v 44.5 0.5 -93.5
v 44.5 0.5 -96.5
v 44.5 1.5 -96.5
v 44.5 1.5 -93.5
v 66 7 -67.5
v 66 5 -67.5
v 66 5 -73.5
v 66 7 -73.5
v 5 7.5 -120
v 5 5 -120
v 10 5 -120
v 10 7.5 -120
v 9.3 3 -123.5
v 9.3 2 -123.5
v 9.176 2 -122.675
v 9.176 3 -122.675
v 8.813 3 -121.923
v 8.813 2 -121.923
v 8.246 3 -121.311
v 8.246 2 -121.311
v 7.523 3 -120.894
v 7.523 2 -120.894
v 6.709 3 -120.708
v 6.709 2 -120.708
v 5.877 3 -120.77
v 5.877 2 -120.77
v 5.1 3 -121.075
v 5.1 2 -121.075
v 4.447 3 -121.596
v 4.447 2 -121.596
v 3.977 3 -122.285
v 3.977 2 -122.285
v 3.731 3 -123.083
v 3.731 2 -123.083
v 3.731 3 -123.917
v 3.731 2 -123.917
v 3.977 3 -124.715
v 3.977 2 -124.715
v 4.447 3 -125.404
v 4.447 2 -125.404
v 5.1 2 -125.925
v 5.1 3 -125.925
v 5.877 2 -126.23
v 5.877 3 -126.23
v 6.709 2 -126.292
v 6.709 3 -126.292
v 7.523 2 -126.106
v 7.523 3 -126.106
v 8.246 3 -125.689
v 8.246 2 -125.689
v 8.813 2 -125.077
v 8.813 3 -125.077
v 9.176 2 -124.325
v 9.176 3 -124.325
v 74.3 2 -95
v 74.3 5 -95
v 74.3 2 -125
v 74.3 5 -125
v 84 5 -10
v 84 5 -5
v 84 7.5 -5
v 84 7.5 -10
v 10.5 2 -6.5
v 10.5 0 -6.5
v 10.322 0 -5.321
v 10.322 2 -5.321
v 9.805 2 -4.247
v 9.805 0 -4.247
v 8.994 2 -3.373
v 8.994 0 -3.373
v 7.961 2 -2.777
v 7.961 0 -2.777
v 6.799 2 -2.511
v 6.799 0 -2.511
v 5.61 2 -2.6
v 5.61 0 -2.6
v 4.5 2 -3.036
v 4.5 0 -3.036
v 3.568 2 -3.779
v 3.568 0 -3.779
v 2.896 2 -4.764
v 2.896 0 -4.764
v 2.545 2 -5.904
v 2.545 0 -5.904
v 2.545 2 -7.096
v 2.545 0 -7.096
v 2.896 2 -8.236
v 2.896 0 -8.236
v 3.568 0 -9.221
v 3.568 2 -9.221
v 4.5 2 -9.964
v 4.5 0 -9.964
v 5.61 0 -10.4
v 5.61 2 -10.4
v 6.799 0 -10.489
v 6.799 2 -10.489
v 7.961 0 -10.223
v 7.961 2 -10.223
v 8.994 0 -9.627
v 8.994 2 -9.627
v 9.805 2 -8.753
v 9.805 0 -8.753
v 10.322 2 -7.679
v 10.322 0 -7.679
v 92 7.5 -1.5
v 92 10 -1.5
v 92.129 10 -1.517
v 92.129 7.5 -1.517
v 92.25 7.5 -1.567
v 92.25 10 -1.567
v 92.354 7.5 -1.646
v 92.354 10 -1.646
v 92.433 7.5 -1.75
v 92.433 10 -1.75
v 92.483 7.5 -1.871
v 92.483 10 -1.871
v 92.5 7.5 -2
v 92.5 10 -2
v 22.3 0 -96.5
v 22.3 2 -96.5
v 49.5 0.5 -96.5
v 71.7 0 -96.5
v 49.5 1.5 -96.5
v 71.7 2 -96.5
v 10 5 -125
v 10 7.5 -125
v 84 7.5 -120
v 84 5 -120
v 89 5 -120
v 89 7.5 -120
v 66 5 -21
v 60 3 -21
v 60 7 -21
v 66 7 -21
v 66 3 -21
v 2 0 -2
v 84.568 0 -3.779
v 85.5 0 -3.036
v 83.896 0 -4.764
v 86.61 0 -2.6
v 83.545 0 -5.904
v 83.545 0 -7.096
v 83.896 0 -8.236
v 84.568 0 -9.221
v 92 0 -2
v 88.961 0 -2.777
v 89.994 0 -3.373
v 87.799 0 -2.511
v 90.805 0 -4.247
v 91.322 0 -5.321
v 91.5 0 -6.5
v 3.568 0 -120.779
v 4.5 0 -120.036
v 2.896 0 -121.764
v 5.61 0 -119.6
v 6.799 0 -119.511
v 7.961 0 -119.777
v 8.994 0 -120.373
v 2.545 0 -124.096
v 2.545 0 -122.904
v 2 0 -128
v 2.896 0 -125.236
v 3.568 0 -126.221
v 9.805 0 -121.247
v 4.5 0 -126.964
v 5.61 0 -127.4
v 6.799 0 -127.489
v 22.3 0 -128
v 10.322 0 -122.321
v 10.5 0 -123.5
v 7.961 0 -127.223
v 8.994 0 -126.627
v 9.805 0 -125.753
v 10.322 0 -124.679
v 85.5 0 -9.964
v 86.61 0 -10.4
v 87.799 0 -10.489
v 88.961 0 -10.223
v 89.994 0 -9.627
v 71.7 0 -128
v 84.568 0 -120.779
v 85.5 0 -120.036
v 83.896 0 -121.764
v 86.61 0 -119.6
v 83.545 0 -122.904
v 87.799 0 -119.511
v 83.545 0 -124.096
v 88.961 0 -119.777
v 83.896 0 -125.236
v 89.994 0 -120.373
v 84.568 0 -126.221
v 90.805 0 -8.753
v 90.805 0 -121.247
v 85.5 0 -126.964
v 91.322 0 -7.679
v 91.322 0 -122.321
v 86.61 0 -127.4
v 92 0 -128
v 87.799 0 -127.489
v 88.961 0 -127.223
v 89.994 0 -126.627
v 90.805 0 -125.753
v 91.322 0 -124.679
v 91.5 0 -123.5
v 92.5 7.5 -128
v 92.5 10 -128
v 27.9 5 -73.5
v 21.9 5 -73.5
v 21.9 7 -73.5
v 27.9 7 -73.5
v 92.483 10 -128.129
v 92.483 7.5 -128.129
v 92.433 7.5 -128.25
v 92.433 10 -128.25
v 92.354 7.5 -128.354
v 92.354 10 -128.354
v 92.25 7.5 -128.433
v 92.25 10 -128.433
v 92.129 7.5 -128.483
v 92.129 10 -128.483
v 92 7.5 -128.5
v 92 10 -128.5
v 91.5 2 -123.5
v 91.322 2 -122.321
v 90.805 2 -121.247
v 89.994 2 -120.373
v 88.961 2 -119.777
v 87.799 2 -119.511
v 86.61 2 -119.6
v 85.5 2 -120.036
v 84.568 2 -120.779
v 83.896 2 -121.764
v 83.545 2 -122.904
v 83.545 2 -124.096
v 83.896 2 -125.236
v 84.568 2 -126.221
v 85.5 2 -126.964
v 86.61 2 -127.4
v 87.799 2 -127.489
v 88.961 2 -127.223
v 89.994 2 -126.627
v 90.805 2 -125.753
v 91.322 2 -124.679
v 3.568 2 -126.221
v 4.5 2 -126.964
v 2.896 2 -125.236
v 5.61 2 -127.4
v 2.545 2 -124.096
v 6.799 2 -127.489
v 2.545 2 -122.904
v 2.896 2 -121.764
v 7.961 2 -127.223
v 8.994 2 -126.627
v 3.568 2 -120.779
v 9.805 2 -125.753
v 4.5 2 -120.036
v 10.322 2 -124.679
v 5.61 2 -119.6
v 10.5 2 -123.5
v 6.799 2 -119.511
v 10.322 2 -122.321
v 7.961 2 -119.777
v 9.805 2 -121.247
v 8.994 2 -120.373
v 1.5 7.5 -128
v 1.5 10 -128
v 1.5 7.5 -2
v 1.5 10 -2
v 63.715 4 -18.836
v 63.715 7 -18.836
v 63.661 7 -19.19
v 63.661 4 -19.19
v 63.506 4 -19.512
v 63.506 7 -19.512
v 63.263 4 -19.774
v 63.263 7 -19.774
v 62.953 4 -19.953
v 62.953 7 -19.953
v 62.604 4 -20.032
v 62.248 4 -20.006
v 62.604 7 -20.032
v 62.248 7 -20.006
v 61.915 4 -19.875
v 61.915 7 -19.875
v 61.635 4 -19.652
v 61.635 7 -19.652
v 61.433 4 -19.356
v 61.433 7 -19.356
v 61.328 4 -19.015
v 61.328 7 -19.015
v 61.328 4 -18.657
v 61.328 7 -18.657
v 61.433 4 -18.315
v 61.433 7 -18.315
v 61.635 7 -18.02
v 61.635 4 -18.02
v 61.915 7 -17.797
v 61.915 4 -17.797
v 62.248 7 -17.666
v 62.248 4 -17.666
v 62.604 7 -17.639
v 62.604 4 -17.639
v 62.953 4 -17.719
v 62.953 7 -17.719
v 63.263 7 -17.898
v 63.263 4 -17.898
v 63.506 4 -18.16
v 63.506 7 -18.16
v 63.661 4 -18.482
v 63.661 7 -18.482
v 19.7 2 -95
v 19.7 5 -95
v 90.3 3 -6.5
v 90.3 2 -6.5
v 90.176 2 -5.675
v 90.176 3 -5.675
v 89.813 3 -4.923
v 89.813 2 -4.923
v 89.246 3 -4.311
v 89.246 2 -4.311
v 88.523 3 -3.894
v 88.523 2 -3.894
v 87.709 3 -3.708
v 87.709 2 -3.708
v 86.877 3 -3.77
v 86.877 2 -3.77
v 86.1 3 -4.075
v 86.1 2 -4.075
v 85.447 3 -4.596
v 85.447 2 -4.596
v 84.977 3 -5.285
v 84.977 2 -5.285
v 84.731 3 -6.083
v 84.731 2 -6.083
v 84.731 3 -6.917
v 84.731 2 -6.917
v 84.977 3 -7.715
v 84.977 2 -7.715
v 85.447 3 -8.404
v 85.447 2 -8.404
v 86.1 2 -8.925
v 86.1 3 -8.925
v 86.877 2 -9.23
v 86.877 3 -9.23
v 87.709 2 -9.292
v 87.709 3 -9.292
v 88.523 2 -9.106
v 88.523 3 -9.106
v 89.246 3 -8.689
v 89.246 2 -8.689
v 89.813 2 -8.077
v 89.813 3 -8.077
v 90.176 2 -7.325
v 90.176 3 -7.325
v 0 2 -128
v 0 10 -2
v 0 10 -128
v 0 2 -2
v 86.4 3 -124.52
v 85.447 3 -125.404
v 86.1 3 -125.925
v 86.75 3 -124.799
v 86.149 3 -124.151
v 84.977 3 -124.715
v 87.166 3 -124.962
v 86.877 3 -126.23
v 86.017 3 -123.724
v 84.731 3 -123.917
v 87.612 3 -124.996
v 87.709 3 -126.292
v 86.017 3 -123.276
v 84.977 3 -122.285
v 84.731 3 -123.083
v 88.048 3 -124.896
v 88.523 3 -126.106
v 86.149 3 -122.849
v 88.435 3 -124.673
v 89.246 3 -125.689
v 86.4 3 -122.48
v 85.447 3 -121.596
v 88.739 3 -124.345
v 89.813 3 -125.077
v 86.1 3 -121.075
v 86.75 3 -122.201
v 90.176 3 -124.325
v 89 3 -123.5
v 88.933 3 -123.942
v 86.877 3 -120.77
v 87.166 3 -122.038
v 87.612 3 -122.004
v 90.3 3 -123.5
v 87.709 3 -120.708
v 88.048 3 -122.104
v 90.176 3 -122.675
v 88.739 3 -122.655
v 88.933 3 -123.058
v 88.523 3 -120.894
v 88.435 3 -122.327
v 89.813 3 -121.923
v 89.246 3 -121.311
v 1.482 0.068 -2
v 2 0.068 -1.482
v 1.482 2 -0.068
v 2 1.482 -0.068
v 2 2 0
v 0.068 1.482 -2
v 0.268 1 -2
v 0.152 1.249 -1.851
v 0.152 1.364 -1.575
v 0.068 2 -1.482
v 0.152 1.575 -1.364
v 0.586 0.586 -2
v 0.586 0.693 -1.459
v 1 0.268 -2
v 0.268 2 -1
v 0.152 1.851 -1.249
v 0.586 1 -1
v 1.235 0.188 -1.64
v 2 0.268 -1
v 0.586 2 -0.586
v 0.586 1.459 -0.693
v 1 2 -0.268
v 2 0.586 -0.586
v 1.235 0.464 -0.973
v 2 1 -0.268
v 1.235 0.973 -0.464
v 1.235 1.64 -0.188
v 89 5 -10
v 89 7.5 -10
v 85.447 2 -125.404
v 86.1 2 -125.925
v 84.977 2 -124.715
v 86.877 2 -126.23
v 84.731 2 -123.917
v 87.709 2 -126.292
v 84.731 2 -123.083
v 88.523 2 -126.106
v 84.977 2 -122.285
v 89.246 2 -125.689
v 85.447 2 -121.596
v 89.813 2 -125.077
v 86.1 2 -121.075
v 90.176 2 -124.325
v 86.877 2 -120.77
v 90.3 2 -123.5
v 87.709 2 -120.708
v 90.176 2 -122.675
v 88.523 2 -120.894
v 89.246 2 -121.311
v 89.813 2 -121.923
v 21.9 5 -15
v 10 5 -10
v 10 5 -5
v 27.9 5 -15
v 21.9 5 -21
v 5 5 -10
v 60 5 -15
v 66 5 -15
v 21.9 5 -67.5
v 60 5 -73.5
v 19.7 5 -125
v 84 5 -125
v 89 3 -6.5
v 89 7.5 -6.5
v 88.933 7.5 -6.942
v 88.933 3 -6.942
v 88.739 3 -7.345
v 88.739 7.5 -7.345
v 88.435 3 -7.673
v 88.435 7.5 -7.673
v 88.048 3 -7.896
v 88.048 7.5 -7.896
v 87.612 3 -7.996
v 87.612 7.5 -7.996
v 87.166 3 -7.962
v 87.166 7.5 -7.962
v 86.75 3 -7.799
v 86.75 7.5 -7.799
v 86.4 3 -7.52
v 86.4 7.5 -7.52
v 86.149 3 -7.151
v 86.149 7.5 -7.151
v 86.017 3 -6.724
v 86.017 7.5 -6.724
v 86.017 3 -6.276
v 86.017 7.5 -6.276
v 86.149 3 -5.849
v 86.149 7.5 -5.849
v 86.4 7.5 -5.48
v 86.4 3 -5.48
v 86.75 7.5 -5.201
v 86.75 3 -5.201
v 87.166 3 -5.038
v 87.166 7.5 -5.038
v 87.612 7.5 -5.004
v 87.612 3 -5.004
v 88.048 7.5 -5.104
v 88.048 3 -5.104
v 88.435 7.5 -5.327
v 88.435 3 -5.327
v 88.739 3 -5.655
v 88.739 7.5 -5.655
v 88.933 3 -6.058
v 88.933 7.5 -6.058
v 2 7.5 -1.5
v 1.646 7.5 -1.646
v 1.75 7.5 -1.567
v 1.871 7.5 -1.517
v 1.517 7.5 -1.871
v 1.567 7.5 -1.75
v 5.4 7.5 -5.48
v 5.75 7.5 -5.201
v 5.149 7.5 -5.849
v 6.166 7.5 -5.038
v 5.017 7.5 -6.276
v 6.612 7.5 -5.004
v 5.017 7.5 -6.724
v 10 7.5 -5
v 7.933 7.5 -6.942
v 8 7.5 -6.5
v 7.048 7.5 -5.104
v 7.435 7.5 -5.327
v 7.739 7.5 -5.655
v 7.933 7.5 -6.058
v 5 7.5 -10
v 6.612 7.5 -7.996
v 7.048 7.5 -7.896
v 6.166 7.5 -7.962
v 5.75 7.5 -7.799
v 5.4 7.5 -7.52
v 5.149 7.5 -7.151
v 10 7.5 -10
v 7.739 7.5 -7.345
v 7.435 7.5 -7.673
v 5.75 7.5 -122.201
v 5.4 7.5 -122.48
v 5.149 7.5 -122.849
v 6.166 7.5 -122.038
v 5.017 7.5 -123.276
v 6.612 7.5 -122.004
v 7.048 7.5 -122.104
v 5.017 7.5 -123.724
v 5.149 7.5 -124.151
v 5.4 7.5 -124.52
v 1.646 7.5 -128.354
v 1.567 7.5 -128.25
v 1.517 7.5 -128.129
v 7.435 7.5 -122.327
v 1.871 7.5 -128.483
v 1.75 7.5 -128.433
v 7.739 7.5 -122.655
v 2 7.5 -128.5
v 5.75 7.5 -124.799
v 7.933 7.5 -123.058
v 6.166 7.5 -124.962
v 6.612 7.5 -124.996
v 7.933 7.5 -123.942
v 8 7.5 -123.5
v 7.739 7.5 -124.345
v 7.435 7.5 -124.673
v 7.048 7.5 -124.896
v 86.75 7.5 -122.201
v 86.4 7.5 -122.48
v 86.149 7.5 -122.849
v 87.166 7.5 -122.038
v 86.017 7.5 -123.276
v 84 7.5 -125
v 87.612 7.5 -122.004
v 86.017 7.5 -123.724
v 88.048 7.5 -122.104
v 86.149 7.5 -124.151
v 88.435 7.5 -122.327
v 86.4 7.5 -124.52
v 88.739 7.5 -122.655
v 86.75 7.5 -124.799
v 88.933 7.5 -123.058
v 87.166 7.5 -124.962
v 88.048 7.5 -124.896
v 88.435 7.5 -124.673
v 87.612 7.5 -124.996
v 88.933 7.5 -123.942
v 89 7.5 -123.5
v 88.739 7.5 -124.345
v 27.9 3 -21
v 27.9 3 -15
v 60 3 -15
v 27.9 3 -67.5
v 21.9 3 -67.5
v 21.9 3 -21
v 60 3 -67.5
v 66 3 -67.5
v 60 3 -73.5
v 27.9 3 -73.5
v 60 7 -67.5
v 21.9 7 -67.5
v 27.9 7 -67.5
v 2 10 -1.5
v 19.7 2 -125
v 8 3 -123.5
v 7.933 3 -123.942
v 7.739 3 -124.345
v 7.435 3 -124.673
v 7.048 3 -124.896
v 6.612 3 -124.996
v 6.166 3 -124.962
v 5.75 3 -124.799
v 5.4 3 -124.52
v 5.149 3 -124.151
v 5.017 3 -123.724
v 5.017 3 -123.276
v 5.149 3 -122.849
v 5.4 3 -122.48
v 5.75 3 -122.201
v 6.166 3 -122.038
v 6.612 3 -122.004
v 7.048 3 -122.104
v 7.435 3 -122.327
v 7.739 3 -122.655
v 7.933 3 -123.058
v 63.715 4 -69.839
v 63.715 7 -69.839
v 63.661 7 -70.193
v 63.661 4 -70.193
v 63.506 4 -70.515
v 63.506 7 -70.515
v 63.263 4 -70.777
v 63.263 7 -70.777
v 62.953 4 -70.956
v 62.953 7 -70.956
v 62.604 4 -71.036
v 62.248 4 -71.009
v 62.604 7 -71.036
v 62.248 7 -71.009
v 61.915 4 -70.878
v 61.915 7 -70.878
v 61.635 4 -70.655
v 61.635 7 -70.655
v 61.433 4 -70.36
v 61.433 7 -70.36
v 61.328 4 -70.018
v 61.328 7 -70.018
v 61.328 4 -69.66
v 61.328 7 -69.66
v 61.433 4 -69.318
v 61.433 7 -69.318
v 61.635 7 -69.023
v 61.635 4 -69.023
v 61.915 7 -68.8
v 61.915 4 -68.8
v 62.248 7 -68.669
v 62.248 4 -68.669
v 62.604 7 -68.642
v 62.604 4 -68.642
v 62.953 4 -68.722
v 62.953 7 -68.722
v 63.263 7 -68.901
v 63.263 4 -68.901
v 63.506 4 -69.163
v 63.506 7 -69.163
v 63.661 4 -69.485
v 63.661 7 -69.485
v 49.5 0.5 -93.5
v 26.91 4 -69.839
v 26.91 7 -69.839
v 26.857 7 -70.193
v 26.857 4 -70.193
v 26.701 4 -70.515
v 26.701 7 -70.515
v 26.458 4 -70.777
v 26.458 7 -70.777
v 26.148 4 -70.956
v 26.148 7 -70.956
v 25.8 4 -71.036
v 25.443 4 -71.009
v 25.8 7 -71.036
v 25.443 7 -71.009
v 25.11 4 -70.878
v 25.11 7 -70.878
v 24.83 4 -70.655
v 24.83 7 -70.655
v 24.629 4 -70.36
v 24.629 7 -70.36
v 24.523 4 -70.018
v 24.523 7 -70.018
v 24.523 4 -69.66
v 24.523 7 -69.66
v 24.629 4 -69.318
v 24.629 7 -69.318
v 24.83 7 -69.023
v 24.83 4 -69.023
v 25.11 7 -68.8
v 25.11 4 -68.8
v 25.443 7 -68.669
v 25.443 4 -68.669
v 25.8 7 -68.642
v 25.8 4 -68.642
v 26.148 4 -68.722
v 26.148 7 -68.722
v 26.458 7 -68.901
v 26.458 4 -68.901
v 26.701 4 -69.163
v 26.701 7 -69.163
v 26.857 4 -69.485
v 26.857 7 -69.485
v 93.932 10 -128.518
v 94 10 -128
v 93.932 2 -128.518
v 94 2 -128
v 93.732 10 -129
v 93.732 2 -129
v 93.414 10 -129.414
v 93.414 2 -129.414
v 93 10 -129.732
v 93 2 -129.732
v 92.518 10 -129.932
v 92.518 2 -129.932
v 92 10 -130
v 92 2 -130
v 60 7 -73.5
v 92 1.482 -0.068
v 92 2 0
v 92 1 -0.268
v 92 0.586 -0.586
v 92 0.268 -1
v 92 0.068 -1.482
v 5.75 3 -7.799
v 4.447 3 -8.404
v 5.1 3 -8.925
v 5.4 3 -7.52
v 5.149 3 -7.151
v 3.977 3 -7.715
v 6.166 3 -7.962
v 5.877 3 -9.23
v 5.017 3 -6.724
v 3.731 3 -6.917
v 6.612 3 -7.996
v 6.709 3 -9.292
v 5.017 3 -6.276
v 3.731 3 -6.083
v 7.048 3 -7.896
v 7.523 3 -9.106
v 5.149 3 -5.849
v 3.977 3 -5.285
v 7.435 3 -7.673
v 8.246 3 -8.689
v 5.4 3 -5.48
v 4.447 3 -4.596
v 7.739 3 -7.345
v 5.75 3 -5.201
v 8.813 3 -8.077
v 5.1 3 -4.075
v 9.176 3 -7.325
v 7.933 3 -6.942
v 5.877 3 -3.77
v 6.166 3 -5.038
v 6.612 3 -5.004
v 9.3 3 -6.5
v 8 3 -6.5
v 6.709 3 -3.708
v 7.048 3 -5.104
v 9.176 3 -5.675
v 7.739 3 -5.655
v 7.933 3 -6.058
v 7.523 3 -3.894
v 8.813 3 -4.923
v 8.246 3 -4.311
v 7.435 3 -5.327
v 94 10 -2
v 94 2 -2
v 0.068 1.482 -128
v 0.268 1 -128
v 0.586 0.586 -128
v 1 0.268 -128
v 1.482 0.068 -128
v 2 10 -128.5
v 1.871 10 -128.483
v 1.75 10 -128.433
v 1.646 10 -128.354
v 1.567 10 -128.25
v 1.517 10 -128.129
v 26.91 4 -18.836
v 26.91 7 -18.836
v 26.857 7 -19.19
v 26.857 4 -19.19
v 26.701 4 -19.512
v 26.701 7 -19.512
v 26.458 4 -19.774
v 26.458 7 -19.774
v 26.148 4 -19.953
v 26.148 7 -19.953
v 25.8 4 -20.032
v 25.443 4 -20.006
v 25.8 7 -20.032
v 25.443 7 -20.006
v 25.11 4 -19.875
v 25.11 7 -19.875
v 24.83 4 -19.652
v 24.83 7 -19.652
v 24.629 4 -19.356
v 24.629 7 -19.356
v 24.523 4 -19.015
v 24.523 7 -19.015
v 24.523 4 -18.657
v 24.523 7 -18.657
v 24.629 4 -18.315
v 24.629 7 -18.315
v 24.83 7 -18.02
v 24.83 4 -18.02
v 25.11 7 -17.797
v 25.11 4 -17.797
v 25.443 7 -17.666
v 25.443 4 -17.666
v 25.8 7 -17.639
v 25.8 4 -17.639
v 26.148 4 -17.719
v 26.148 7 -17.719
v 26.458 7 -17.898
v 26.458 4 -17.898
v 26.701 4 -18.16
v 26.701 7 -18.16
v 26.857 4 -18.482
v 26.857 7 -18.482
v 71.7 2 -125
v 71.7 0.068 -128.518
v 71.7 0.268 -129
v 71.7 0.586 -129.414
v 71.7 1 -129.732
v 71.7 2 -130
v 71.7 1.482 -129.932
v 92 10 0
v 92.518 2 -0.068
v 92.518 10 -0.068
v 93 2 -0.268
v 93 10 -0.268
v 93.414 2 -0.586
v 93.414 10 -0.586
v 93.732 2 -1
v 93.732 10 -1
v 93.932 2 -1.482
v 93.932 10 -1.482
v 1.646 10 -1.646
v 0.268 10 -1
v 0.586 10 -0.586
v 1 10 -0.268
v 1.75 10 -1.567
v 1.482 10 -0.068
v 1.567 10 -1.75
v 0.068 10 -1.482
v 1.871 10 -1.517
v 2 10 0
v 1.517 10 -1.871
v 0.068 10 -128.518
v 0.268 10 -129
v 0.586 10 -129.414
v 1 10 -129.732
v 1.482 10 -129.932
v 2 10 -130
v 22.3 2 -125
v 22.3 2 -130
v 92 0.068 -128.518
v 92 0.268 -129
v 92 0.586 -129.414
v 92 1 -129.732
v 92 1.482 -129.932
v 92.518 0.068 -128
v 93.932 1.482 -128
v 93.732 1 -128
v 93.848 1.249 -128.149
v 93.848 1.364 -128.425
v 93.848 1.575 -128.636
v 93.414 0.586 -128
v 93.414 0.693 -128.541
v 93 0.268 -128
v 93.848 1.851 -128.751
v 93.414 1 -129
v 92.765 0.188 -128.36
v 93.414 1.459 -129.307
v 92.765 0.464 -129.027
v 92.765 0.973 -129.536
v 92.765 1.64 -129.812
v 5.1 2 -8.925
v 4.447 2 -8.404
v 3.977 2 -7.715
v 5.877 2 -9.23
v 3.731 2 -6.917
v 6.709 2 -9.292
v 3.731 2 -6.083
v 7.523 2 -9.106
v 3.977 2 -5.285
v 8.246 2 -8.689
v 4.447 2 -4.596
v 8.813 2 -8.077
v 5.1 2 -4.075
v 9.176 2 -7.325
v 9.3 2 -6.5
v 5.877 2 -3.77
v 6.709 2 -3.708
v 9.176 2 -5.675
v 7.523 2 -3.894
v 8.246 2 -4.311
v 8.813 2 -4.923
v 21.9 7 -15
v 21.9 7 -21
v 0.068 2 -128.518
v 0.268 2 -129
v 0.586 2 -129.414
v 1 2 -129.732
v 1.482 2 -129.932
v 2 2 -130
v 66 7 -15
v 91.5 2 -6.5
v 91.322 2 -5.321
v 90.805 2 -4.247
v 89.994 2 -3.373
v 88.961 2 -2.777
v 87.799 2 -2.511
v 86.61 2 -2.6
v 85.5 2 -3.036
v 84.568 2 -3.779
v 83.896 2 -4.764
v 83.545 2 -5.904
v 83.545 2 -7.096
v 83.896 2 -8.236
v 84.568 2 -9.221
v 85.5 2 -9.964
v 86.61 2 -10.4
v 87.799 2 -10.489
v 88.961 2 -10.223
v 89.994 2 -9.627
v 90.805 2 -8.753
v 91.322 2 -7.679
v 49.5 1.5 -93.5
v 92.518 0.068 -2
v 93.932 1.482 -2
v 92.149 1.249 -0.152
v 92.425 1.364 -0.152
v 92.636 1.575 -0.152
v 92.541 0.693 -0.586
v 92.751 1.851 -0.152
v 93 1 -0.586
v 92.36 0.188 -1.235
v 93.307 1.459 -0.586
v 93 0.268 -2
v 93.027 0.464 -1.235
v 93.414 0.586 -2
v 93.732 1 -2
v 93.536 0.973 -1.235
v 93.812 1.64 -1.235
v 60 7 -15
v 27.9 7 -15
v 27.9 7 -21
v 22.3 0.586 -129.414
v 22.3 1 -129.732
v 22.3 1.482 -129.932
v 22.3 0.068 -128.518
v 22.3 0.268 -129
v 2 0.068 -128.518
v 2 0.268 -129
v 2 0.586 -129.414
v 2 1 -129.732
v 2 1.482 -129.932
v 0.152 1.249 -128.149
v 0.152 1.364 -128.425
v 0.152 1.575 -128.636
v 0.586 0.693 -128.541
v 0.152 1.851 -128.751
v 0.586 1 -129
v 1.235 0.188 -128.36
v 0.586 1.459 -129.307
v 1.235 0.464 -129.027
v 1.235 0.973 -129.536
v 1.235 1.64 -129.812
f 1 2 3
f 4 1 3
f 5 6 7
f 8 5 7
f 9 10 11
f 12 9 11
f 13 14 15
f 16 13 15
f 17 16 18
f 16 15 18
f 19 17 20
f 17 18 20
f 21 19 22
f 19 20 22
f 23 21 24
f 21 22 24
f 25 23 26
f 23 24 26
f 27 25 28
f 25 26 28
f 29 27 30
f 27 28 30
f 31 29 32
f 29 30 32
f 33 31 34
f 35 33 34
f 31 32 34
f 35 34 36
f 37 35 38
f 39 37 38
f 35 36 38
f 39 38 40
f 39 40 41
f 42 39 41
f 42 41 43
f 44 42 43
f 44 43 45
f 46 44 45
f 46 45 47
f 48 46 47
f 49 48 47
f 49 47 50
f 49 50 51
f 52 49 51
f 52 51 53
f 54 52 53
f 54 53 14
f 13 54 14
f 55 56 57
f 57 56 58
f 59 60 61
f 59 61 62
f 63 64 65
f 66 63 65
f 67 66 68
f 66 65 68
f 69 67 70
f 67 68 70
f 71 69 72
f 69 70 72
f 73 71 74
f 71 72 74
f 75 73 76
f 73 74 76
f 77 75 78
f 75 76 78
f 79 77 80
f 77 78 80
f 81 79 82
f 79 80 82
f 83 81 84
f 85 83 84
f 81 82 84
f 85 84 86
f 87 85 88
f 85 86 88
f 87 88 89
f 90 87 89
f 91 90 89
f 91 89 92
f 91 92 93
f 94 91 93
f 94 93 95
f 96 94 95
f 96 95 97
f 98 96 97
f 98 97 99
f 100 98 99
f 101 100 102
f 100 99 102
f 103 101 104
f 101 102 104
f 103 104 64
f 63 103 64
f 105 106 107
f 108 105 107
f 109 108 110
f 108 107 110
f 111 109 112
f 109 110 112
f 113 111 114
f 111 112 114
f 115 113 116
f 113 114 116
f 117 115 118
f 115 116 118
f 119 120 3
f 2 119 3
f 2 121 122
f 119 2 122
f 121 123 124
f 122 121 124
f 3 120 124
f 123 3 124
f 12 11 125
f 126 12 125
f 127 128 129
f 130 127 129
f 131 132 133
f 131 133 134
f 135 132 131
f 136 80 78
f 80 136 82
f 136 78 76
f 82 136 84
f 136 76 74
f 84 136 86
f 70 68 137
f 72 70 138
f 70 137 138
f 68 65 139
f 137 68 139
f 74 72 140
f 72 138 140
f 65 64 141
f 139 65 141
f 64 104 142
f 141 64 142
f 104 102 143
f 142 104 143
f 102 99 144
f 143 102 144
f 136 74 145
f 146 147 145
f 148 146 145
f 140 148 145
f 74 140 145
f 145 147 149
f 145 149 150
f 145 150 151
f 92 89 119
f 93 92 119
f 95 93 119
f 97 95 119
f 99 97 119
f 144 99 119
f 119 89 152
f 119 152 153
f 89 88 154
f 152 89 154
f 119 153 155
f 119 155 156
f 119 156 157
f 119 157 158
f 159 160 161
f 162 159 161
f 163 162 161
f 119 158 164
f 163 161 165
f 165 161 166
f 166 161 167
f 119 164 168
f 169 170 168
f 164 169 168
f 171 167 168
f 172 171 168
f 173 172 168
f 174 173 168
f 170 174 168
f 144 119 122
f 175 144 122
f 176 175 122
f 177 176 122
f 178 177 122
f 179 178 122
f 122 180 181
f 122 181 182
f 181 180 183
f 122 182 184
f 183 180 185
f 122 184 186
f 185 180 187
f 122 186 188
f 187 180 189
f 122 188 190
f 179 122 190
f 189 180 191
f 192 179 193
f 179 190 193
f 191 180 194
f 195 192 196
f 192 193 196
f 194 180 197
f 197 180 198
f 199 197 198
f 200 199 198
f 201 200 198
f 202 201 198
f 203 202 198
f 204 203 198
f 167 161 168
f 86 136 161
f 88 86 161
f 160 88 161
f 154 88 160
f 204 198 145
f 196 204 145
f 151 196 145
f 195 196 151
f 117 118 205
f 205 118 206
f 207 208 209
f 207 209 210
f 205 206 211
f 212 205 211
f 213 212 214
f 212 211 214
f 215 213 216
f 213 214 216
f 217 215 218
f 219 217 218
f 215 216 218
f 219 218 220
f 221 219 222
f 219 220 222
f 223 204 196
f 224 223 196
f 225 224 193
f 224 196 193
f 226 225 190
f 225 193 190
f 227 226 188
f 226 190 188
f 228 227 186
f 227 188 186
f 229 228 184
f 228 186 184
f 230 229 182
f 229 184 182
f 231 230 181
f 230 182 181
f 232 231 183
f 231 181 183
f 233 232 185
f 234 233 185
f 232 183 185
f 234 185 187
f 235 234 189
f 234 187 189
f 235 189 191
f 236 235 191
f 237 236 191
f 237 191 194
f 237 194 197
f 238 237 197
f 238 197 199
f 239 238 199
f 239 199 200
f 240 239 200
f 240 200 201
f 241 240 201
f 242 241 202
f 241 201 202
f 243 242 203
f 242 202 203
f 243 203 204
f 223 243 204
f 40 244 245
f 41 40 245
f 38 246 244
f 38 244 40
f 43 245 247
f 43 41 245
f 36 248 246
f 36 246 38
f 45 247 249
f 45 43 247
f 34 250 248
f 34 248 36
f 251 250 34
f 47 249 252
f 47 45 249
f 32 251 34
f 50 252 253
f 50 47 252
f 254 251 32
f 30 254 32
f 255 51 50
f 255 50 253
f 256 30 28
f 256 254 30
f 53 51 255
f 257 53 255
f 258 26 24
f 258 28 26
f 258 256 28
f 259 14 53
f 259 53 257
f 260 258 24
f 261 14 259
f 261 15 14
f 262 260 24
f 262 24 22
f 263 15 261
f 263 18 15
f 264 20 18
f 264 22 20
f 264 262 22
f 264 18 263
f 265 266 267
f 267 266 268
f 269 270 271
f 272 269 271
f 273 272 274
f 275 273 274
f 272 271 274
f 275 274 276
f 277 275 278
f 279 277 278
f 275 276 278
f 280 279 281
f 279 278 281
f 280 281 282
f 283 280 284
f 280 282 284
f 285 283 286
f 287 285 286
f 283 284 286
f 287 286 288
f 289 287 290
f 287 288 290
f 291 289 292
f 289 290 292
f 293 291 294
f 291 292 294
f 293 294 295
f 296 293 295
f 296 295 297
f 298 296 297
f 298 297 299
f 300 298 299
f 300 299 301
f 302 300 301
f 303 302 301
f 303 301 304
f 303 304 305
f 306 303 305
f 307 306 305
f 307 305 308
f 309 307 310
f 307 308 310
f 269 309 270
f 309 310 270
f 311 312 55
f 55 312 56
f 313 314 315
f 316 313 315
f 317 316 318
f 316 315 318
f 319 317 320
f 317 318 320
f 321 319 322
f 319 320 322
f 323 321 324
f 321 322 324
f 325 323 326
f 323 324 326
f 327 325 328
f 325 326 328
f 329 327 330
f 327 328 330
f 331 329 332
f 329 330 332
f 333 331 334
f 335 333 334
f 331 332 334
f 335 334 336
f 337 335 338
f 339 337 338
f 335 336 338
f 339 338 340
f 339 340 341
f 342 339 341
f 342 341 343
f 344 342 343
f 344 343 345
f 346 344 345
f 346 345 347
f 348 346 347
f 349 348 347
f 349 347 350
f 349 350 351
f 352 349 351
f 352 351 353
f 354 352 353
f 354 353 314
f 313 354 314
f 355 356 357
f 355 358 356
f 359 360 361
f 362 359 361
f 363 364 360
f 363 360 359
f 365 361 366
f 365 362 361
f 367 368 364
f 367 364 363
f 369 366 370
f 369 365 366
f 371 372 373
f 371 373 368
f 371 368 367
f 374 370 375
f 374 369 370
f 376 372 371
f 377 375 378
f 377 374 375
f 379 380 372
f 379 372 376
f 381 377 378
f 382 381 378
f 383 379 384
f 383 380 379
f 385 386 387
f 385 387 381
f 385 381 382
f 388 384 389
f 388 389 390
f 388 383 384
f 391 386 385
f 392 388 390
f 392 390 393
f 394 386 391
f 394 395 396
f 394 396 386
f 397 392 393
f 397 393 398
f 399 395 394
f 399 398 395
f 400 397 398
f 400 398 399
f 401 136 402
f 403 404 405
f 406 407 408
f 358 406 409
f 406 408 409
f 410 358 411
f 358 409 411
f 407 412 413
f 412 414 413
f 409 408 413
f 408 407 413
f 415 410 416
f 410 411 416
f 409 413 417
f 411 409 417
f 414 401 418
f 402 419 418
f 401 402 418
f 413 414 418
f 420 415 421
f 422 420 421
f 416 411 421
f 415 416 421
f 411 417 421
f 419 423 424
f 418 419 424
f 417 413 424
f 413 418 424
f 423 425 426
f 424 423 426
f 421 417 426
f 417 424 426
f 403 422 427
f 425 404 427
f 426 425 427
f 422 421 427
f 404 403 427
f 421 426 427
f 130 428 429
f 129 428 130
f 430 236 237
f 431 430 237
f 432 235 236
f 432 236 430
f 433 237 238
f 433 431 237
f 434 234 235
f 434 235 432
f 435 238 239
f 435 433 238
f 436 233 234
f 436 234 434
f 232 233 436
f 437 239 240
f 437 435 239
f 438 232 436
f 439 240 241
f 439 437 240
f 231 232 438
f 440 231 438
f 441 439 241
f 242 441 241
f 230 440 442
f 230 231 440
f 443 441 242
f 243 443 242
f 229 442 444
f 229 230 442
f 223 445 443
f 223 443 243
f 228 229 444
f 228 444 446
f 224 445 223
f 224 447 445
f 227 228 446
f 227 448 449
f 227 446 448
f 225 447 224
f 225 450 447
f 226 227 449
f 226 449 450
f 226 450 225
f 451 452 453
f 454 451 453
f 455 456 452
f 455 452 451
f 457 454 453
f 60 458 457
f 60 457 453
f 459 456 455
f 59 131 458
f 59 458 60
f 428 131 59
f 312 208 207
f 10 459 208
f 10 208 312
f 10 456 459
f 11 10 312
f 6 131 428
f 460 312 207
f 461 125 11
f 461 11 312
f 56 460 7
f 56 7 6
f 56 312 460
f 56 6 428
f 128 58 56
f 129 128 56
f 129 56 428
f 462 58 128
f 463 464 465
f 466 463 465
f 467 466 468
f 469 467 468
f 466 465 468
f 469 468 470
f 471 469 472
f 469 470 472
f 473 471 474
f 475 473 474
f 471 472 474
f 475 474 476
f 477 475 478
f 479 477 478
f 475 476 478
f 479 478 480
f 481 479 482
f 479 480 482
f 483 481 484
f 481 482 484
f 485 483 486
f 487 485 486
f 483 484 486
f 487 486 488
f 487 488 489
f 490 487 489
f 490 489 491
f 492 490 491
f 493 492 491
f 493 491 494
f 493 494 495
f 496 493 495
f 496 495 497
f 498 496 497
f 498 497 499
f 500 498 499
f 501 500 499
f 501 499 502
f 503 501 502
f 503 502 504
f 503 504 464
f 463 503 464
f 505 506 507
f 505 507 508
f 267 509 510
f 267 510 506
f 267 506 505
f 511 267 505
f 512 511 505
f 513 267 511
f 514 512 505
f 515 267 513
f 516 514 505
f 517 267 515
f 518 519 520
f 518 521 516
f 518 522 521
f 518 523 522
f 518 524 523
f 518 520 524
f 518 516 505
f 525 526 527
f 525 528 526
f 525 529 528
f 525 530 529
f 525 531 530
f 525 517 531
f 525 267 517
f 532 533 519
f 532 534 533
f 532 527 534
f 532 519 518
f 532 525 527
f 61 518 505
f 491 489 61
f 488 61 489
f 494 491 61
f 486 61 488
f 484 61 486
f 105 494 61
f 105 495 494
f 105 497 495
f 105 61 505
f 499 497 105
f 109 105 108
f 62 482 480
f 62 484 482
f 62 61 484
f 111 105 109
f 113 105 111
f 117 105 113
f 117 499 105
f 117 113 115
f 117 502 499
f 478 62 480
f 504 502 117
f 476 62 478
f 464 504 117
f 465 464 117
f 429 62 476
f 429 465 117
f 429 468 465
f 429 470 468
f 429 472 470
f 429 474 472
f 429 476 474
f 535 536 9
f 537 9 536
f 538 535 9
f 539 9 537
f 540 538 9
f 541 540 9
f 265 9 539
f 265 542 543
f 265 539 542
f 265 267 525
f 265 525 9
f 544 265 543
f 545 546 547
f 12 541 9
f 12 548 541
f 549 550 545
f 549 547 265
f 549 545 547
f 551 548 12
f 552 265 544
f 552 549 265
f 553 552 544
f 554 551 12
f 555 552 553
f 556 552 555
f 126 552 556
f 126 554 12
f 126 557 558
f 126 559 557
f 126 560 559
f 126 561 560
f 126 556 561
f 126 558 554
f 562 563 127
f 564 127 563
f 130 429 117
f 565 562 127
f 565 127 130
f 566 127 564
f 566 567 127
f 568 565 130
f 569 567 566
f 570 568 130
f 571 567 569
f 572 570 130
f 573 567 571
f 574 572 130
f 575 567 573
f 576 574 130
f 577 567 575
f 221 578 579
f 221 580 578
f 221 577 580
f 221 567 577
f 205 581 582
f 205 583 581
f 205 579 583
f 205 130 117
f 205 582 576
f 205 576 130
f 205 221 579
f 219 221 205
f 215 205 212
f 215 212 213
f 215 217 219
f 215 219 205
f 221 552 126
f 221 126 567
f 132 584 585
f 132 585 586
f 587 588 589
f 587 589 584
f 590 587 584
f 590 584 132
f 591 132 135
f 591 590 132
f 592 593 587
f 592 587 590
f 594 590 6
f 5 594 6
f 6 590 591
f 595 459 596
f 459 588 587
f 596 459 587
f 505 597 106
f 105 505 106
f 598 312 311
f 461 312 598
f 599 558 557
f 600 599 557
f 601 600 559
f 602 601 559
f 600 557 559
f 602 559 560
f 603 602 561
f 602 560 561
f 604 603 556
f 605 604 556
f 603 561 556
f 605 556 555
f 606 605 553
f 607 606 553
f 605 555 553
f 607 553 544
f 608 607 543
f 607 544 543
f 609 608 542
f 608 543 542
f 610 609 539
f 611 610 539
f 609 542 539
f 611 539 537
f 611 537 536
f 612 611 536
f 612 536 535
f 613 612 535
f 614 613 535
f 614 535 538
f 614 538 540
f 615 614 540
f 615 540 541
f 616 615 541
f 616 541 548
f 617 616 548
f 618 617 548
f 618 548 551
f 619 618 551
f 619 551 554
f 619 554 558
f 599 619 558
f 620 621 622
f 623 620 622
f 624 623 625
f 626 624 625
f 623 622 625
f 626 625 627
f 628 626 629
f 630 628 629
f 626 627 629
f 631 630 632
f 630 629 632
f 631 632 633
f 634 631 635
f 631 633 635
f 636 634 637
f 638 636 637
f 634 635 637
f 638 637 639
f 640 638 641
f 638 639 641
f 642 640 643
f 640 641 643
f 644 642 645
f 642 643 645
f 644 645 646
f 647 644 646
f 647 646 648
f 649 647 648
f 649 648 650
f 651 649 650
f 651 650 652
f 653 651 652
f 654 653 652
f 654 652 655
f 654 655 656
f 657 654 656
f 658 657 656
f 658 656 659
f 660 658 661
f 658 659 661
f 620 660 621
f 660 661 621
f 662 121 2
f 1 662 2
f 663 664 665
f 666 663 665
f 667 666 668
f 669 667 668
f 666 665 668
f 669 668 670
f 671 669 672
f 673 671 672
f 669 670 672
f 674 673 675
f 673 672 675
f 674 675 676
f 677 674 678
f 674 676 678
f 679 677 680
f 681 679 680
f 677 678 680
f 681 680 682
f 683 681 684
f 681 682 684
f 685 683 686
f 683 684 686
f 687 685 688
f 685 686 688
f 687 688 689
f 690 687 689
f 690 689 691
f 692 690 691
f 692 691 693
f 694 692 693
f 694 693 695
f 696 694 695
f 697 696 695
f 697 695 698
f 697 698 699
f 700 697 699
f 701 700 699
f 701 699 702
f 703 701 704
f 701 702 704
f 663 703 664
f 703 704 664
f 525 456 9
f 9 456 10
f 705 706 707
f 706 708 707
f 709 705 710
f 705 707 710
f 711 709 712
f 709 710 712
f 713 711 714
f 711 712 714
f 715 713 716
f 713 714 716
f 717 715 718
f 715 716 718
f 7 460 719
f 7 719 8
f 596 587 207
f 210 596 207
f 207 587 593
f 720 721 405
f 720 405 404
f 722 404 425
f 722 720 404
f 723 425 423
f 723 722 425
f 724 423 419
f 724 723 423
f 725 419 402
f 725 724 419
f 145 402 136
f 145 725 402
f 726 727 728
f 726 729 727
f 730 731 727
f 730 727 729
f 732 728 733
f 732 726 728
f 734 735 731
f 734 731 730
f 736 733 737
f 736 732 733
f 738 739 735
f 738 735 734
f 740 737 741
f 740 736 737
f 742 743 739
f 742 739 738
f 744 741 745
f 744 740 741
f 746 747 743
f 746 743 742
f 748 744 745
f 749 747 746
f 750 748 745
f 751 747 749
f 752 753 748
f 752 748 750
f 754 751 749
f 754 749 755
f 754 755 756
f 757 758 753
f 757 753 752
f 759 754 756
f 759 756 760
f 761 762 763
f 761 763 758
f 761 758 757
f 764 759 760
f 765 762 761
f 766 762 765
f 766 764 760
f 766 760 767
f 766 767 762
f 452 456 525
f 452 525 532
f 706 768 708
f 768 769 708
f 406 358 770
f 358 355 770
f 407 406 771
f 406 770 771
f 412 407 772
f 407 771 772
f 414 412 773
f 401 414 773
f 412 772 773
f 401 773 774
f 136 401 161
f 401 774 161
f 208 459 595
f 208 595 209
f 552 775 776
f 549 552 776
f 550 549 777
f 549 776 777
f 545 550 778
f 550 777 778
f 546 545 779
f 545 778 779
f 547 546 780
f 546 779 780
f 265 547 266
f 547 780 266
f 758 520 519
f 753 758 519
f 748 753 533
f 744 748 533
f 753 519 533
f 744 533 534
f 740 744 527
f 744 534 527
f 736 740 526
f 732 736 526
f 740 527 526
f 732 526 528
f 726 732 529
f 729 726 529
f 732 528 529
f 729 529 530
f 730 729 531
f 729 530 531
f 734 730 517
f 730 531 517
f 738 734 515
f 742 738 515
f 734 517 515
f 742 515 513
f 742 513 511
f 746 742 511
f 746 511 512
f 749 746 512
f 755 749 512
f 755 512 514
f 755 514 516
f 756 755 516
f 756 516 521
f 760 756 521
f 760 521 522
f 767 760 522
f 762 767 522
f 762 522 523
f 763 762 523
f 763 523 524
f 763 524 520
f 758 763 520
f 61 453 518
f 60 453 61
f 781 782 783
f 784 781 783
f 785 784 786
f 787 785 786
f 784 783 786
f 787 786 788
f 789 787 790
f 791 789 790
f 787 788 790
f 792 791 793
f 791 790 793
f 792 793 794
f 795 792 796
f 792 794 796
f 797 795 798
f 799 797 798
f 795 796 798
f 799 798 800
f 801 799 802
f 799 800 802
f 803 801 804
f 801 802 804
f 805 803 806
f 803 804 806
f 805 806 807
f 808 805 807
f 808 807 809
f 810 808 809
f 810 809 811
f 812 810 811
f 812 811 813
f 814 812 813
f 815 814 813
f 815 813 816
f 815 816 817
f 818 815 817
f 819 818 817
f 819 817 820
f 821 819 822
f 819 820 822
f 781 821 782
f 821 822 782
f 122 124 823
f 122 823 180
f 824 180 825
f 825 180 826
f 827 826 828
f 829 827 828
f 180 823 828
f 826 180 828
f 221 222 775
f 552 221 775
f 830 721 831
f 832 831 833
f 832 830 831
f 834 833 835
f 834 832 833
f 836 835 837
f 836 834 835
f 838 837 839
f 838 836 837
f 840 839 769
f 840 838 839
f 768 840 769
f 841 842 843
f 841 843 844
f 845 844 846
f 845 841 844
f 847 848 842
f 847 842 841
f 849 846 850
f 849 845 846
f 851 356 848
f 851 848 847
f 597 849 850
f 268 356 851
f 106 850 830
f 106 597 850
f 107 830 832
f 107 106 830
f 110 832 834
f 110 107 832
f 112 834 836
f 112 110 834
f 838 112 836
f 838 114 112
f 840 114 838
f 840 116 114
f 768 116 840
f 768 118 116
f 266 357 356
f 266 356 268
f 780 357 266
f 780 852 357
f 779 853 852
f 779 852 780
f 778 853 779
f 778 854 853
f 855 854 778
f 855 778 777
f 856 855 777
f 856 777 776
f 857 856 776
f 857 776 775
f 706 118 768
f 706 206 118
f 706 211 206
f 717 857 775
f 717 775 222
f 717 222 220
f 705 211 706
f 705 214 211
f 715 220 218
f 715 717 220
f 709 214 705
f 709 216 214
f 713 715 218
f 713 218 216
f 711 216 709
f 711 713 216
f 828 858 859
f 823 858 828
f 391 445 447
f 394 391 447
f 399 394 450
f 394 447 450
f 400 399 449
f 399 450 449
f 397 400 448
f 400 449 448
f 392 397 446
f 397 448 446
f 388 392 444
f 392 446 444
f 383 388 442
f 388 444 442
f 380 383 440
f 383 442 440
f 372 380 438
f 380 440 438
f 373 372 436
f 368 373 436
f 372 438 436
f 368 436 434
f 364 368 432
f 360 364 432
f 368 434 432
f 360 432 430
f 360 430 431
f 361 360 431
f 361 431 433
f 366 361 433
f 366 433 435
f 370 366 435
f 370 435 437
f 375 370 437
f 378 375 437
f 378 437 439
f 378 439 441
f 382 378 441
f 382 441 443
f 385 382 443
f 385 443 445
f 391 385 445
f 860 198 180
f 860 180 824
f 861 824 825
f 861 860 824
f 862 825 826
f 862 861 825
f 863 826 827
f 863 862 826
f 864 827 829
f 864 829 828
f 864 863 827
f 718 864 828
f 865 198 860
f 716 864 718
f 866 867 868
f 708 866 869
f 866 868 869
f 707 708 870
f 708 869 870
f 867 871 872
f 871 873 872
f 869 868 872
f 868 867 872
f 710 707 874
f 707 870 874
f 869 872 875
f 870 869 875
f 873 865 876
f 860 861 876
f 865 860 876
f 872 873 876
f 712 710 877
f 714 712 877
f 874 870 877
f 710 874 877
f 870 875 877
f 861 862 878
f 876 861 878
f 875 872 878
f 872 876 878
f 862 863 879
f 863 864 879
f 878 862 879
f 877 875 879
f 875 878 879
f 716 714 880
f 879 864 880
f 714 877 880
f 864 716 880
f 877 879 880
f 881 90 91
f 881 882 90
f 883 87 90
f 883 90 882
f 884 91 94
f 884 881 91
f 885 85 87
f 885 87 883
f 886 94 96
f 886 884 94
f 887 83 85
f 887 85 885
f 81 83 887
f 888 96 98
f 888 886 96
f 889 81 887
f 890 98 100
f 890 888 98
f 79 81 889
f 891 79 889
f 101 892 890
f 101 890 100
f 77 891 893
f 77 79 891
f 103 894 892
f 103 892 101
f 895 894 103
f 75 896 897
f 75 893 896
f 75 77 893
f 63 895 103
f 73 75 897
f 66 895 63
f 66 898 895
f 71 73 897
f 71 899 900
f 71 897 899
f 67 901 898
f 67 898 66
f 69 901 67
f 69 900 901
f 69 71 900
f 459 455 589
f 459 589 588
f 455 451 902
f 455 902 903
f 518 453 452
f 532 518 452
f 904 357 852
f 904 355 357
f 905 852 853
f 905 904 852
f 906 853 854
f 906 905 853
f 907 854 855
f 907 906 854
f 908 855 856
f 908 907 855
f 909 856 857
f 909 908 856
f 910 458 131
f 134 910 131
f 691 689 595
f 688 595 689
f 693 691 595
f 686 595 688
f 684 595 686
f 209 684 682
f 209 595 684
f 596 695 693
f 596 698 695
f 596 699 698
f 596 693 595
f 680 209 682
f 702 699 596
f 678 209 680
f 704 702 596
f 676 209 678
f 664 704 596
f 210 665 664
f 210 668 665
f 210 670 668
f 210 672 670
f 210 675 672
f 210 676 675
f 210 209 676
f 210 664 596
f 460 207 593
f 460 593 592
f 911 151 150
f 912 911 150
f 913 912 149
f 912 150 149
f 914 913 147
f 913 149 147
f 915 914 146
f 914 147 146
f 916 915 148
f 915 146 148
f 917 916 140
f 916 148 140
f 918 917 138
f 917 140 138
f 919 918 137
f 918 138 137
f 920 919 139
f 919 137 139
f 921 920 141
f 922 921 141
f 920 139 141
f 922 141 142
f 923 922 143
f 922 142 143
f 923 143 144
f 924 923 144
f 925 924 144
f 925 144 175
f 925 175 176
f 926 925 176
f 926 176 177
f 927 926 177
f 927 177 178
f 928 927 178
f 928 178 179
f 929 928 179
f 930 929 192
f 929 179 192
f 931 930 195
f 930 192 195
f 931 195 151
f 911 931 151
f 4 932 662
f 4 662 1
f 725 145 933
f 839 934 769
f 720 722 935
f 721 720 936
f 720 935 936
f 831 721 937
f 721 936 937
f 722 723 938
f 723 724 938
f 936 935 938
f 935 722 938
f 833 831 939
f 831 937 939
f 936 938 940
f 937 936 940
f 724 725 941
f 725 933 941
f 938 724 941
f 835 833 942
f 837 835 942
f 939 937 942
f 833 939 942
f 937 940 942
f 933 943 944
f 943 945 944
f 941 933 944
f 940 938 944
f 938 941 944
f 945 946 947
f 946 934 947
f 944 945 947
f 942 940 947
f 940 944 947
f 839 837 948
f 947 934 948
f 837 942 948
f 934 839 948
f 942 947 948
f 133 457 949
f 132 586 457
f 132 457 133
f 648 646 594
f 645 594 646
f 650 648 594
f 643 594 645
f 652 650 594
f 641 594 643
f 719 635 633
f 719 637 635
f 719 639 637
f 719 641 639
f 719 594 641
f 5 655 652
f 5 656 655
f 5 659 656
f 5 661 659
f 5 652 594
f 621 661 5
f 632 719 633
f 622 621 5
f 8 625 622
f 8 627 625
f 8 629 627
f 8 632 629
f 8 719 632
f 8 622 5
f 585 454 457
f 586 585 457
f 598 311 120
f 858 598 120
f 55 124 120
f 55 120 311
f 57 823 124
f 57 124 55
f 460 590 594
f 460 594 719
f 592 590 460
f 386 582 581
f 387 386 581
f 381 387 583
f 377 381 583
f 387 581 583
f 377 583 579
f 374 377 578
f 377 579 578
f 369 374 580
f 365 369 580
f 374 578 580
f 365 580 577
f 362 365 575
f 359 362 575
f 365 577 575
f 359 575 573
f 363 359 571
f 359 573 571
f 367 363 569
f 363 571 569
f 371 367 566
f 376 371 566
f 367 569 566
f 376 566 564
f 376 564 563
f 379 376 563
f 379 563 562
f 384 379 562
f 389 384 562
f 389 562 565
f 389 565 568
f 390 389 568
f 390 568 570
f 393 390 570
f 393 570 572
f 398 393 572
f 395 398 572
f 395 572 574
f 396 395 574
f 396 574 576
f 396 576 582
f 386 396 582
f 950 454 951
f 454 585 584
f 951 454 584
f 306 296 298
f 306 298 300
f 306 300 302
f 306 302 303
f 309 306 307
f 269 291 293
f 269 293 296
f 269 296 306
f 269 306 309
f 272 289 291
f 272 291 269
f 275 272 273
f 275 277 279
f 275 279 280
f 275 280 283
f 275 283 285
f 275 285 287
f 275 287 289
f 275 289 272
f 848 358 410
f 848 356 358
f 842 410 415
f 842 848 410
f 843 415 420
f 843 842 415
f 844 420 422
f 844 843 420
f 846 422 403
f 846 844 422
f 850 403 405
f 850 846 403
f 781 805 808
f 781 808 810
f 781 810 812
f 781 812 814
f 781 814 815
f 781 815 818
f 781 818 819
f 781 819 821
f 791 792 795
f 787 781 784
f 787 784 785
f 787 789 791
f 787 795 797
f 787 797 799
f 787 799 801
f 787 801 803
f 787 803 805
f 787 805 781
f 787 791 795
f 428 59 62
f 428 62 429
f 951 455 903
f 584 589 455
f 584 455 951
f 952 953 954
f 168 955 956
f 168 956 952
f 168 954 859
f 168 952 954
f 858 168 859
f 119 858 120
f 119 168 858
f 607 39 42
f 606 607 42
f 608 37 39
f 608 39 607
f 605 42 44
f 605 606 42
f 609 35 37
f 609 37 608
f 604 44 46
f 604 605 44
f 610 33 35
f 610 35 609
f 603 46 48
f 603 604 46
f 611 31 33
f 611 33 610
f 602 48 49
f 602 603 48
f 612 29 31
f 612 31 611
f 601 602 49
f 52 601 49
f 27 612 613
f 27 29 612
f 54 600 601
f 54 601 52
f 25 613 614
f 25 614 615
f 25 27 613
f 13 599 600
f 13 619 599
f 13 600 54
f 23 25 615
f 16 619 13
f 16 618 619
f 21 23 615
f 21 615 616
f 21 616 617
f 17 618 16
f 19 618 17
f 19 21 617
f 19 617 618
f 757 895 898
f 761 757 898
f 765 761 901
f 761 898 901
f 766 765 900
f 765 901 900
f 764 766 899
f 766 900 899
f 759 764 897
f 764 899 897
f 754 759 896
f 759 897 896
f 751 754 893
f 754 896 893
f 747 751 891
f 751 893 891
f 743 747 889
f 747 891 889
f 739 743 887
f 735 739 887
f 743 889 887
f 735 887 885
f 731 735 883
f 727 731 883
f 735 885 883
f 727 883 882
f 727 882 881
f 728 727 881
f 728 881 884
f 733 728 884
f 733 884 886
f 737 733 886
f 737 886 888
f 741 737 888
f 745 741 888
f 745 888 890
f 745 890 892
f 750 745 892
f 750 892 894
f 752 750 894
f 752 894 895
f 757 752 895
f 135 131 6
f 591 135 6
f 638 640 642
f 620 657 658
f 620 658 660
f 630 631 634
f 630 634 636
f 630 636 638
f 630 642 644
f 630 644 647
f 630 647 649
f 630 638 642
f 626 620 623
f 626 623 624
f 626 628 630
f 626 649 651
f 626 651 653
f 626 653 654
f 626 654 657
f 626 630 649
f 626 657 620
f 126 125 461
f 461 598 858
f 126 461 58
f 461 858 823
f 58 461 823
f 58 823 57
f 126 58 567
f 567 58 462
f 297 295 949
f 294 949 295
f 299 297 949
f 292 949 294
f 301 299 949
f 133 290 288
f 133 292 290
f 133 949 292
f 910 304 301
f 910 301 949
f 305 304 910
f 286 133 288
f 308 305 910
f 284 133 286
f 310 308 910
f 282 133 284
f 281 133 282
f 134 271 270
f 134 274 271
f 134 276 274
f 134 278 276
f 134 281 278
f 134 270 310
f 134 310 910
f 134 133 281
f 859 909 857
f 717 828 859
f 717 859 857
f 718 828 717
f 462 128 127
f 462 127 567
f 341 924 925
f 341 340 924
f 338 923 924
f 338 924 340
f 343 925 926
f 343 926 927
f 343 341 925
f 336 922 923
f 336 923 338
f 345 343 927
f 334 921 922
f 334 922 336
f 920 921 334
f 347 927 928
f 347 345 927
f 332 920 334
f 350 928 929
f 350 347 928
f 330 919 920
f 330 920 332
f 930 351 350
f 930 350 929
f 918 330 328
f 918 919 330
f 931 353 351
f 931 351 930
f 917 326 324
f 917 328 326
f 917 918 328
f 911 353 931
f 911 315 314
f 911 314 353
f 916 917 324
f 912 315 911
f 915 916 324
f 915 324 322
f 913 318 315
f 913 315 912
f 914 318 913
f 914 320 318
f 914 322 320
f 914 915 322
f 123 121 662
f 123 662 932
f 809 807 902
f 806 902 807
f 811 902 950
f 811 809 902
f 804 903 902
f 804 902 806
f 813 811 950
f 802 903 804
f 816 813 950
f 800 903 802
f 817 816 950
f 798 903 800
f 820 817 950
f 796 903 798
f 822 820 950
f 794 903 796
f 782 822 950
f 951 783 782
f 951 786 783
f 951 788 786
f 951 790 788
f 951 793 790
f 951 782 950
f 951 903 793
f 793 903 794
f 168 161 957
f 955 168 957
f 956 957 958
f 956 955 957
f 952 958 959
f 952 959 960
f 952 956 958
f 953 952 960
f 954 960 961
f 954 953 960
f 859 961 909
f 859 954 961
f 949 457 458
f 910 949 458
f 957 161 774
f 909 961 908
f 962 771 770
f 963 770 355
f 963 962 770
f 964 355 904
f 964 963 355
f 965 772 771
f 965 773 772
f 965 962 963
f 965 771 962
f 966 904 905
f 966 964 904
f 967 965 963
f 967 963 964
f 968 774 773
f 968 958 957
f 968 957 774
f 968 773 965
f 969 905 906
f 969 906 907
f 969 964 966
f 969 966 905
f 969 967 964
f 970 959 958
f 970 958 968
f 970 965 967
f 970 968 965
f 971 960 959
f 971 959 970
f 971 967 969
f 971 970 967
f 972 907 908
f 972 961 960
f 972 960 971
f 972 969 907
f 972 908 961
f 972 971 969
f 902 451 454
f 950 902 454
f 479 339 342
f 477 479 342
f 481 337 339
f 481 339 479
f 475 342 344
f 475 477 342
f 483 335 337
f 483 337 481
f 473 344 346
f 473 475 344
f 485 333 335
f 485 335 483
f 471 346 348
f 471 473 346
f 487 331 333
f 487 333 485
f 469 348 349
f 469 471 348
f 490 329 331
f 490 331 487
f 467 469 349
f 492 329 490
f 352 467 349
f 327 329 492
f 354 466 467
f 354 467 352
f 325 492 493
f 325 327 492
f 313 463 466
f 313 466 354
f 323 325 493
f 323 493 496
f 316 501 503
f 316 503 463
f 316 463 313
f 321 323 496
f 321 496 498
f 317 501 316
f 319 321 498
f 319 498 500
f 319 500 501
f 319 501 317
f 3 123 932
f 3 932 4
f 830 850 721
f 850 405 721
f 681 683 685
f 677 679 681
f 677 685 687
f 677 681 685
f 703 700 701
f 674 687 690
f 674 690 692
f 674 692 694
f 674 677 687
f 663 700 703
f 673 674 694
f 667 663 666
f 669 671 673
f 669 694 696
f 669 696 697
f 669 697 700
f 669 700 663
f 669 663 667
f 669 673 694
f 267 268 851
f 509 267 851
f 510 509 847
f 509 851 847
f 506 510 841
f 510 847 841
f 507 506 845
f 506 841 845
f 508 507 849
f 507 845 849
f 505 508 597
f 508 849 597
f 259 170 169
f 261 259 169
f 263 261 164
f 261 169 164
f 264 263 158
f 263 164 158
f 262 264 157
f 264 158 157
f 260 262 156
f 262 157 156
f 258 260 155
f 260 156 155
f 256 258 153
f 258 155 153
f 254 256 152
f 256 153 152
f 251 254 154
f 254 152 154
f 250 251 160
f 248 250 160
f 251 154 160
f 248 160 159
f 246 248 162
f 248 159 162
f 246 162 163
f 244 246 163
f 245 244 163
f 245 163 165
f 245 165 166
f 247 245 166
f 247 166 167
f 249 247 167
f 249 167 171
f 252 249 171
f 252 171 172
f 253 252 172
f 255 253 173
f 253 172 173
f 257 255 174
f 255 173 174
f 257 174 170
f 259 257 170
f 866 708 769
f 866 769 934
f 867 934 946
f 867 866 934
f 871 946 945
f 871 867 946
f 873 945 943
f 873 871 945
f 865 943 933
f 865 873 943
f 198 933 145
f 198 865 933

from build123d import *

# Parameters (mm, degrees)
SKETCH1_W           = 94
SKETCH1_H           = 130
BOSS_EXTRUDE1_DEPTH = 5
SKETCH2_W           = 94
SKETCH2_H           = 130
SKETCH2_W_2         = 84
SKETCH2_H_2         = 120
BOSS_EXTRUDE2_DEPTH = 5
FILLET1_R           = 2
SKETCH3_W           = 44.1
SKETCH3_H           = 58.5
CUT_EXTRUDE1_DEPTH  = 2
SKETCH5_W           = 6
SKETCH5_H           = 6
BOSS_EXTRUDE4_DEPTH = 4
SKETCH7_R           = 1.20000014
CUT_EXTRUDE2_DEPTH  = 3
SKETCH8_W           = 54.6
SKETCH8_H           = 30
CUT_EXTRUDE3_DEPTH  = 3
SKETCH9_W           = 49.4
SKETCH9_H           = 27
CUT_EXTRUDE4_DEPTH  = 2
SKETCH10_W          = 49.4
SKETCH10_H          = 6.619549161
CUT_EXTRUDE5_DEPTH  = 2
SKETCH11_W          = 5
SKETCH11_H          = 1
CUT_EXTRUDE6_DEPTH  = 3
SKETCH14_W          = 84
SKETCH14_H          = 120
CUT_EXTRUDE8_DEPTH  = 2.5
SKETCH15_W          = 5
SKETCH15_H          = 5
BOSS_EXTRUDE5_DEPTH = 2.5
SKETCH16_R          = 1.5
CUT_EXTRUDE9_DEPTH  = 8.5
SKETCH17_R          = 2.8
CUT_EXTRUDE10_DEPTH = 3
SKETCH18_R          = 4
CUT_EXTRUDE11_DEPTH = 2


with BuildPart() as part:
    # Sketch1 → Boss-Extrude1 (new body)
    with BuildSketch(Plane(origin=(0, 0, 0), x_dir=(1, 0, 0), z_dir=(0, 1, 0))):
        with Locations((47, 65)):
            Rectangle(SKETCH1_W, SKETCH1_H)
    extrude(amount=BOSS_EXTRUDE1_DEPTH)

    # Sketch2 → Boss-Extrude2 (add)
    with BuildSketch(Plane(origin=(0, 5, 0), x_dir=(1, 0, 0), z_dir=(0, 1, 0))):
        with Locations((47, 65)):
            Rectangle(SKETCH2_W, SKETCH2_H)
        with Locations((47, 65)):
            Rectangle(SKETCH2_W_2, SKETCH2_H_2, mode=Mode.SUBTRACT)
    extrude(amount=BOSS_EXTRUDE2_DEPTH)

    # Fillet1
    fillet1_edges = [part.edges().sort_by_distance(p)[0] for p in [
        (47, 0, -130),
        (94, 0, -65),
        (47, 0, 0),
        (0, 0, -65),
        (0, 5, -130),
        (94, 5, -130),
        (94, 5, 0),
        (0, 5, 0),
    ]]
    fillet(fillet1_edges, radius=FILLET1_R)

    # Sketch3 → Cut-Extrude1 (cut)
    with BuildSketch(Plane(origin=(0, 5, 0), x_dir=(1, 0, 0), z_dir=(0, 1, 0))):
        with Locations((43.95, 44.25)):
            Rectangle(SKETCH3_W, SKETCH3_H)
    extrude(amount=-CUT_EXTRUDE1_DEPTH, mode=Mode.SUBTRACT)

    # Sketch5 → Boss-Extrude4 (add)
    with BuildSketch(Plane(origin=(0, 3, 0), x_dir=(1, 0, 0), z_dir=(0, 1, 0))):
        with Locations((24.9, 70.5)):
            Rectangle(SKETCH5_W, SKETCH5_H)
        with Locations((63, 70.5)):
            Rectangle(SKETCH5_W, SKETCH5_H)
        with Locations((63, 18)):
            Rectangle(SKETCH5_W, SKETCH5_H)
        with Locations((24.9, 18)):
            Rectangle(SKETCH5_W, SKETCH5_H)
    extrude(amount=BOSS_EXTRUDE4_DEPTH)

    # Sketch7 → Cut-Extrude2 (cut)
    with BuildSketch(Plane(origin=(0, 7, 0), x_dir=(1, 0, 0), z_dir=(0, 1, 0))):
        with Locations((25.710000549, 69.839000092)):
            Circle(SKETCH7_R)
        with Locations((62.514600549, 69.839000092)):
            Circle(SKETCH7_R)
        with Locations((62.514600549, 18.835800092)):
            Circle(SKETCH7_R)
        with Locations((25.710000549, 18.835800092)):
            Circle(SKETCH7_R)
    extrude(amount=-CUT_EXTRUDE2_DEPTH, mode=Mode.SUBTRACT)

    # Sketch8 → Cut-Extrude3 (cut)
    with BuildSketch(Plane(origin=(0, 5, 0), x_dir=(1, 0, 0), z_dir=(0, 1, 0))):
        with Locations((47, 110)):
            Rectangle(SKETCH8_W, SKETCH8_H)
    extrude(amount=-CUT_EXTRUDE3_DEPTH, mode=Mode.SUBTRACT)

    # Sketch9 → Cut-Extrude4 (cut)
    with BuildSketch(Plane(origin=(0, 2, 0), x_dir=(1, 0, 0), z_dir=(0, 1, 0))):
        with Locations((47, 110)):
            Rectangle(SKETCH9_W, SKETCH9_H)
    extrude(amount=-CUT_EXTRUDE4_DEPTH, mode=Mode.SUBTRACT)

    # Sketch10 → Cut-Extrude5 (cut)
    with BuildSketch(Plane.XZ):
        with Locations((47, -126.809774581)):
            Rectangle(SKETCH10_W, SKETCH10_H)
    extrude(amount=-CUT_EXTRUDE5_DEPTH, mode=Mode.SUBTRACT)

    # Sketch11 → Cut-Extrude6 (cut)
    with BuildSketch(Plane(origin=(0, 0, -96.5), x_dir=(-1, 0, 0), z_dir=(0, 0, -1))):
        with Locations((-47, 1)):
            Rectangle(SKETCH11_W, SKETCH11_H)
    extrude(amount=-CUT_EXTRUDE6_DEPTH, mode=Mode.SUBTRACT)

    # Sketch14 → Cut-Extrude8 (cut)
    with BuildSketch(Plane(origin=(0, 10, 0), x_dir=(1, 0, 0), z_dir=(0, 1, 0))):
        with BuildLine():
            Line((92.5, 2), (92.5, 128))
            ThreePointArc((92.5, 128), (92.353553391, 128.353553391), (92, 128.5))
            Line((92, 128.5), (2, 128.5))
            ThreePointArc((2, 128.5), (1.646446609, 128.353553391), (1.5, 128))
            Line((1.5, 128), (1.5, 2))
            ThreePointArc((1.5, 2), (1.646446609, 1.646446609), (2, 1.5))
            Line((2, 1.5), (92, 1.5))
            ThreePointArc((92, 1.5), (92.353553391, 1.646446609), (92.5, 2))
        make_face()
        with Locations((47, 65)):
            Rectangle(SKETCH14_W, SKETCH14_H, mode=Mode.SUBTRACT)
    extrude(amount=-CUT_EXTRUDE8_DEPTH, mode=Mode.SUBTRACT)

    # Sketch15 → Boss-Extrude5 (add)
    with BuildSketch(Plane(origin=(0, 5, 0), x_dir=(1, 0, 0), z_dir=(0, 1, 0))):
        with Locations((86.5, 122.5)):
            Rectangle(SKETCH15_W, SKETCH15_H)
        with Locations((7.5, 122.5)):
            Rectangle(SKETCH15_W, SKETCH15_H)
        with Locations((7.5, 7.5)):
            Rectangle(SKETCH15_W, SKETCH15_H)
        with Locations((86.5, 7.5)):
            Rectangle(SKETCH15_W, SKETCH15_H)
    extrude(amount=BOSS_EXTRUDE5_DEPTH)

    # Sketch16 → Cut-Extrude9 (cut, through all)
    with BuildSketch(Plane(origin=(0, 7.5, 0), x_dir=(1, 0, 0), z_dir=(0, 1, 0))):
        with Locations((6.5, 123.5)):
            Circle(SKETCH16_R)
        with Locations((87.5, 123.5)):
            Circle(SKETCH16_R)
        with Locations((87.5, 6.5)):
            Circle(SKETCH16_R)
        with Locations((6.5, 6.5)):
            Circle(SKETCH16_R)
    extrude(amount=-CUT_EXTRUDE9_DEPTH, mode=Mode.SUBTRACT)

    # Sketch17 → Cut-Extrude10 (cut)
    with BuildSketch(Plane.XZ):
        with Locations((6.5, -6.5)):
            Circle(SKETCH17_R)
        with Locations((87.5, -6.5)):
            Circle(SKETCH17_R)
        with Locations((87.5, -123.5)):
            Circle(SKETCH17_R)
        with Locations((6.5, -123.5)):
            Circle(SKETCH17_R)
    extrude(amount=-CUT_EXTRUDE10_DEPTH, mode=Mode.SUBTRACT)

    # Sketch18 → Cut-Extrude11 (cut)
    with BuildSketch(Plane.XZ):
        with Locations((6.5, -123.5)):
            Circle(SKETCH18_R)
        with Locations((87.5, -123.5)):
            Circle(SKETCH18_R)
        with Locations((87.5, -6.5)):
            Circle(SKETCH18_R)
        with Locations((6.5, -6.5)):
            Circle(SKETCH18_R)
    extrude(amount=-CUT_EXTRUDE11_DEPTH, mode=Mode.SUBTRACT)


solid = part.part
